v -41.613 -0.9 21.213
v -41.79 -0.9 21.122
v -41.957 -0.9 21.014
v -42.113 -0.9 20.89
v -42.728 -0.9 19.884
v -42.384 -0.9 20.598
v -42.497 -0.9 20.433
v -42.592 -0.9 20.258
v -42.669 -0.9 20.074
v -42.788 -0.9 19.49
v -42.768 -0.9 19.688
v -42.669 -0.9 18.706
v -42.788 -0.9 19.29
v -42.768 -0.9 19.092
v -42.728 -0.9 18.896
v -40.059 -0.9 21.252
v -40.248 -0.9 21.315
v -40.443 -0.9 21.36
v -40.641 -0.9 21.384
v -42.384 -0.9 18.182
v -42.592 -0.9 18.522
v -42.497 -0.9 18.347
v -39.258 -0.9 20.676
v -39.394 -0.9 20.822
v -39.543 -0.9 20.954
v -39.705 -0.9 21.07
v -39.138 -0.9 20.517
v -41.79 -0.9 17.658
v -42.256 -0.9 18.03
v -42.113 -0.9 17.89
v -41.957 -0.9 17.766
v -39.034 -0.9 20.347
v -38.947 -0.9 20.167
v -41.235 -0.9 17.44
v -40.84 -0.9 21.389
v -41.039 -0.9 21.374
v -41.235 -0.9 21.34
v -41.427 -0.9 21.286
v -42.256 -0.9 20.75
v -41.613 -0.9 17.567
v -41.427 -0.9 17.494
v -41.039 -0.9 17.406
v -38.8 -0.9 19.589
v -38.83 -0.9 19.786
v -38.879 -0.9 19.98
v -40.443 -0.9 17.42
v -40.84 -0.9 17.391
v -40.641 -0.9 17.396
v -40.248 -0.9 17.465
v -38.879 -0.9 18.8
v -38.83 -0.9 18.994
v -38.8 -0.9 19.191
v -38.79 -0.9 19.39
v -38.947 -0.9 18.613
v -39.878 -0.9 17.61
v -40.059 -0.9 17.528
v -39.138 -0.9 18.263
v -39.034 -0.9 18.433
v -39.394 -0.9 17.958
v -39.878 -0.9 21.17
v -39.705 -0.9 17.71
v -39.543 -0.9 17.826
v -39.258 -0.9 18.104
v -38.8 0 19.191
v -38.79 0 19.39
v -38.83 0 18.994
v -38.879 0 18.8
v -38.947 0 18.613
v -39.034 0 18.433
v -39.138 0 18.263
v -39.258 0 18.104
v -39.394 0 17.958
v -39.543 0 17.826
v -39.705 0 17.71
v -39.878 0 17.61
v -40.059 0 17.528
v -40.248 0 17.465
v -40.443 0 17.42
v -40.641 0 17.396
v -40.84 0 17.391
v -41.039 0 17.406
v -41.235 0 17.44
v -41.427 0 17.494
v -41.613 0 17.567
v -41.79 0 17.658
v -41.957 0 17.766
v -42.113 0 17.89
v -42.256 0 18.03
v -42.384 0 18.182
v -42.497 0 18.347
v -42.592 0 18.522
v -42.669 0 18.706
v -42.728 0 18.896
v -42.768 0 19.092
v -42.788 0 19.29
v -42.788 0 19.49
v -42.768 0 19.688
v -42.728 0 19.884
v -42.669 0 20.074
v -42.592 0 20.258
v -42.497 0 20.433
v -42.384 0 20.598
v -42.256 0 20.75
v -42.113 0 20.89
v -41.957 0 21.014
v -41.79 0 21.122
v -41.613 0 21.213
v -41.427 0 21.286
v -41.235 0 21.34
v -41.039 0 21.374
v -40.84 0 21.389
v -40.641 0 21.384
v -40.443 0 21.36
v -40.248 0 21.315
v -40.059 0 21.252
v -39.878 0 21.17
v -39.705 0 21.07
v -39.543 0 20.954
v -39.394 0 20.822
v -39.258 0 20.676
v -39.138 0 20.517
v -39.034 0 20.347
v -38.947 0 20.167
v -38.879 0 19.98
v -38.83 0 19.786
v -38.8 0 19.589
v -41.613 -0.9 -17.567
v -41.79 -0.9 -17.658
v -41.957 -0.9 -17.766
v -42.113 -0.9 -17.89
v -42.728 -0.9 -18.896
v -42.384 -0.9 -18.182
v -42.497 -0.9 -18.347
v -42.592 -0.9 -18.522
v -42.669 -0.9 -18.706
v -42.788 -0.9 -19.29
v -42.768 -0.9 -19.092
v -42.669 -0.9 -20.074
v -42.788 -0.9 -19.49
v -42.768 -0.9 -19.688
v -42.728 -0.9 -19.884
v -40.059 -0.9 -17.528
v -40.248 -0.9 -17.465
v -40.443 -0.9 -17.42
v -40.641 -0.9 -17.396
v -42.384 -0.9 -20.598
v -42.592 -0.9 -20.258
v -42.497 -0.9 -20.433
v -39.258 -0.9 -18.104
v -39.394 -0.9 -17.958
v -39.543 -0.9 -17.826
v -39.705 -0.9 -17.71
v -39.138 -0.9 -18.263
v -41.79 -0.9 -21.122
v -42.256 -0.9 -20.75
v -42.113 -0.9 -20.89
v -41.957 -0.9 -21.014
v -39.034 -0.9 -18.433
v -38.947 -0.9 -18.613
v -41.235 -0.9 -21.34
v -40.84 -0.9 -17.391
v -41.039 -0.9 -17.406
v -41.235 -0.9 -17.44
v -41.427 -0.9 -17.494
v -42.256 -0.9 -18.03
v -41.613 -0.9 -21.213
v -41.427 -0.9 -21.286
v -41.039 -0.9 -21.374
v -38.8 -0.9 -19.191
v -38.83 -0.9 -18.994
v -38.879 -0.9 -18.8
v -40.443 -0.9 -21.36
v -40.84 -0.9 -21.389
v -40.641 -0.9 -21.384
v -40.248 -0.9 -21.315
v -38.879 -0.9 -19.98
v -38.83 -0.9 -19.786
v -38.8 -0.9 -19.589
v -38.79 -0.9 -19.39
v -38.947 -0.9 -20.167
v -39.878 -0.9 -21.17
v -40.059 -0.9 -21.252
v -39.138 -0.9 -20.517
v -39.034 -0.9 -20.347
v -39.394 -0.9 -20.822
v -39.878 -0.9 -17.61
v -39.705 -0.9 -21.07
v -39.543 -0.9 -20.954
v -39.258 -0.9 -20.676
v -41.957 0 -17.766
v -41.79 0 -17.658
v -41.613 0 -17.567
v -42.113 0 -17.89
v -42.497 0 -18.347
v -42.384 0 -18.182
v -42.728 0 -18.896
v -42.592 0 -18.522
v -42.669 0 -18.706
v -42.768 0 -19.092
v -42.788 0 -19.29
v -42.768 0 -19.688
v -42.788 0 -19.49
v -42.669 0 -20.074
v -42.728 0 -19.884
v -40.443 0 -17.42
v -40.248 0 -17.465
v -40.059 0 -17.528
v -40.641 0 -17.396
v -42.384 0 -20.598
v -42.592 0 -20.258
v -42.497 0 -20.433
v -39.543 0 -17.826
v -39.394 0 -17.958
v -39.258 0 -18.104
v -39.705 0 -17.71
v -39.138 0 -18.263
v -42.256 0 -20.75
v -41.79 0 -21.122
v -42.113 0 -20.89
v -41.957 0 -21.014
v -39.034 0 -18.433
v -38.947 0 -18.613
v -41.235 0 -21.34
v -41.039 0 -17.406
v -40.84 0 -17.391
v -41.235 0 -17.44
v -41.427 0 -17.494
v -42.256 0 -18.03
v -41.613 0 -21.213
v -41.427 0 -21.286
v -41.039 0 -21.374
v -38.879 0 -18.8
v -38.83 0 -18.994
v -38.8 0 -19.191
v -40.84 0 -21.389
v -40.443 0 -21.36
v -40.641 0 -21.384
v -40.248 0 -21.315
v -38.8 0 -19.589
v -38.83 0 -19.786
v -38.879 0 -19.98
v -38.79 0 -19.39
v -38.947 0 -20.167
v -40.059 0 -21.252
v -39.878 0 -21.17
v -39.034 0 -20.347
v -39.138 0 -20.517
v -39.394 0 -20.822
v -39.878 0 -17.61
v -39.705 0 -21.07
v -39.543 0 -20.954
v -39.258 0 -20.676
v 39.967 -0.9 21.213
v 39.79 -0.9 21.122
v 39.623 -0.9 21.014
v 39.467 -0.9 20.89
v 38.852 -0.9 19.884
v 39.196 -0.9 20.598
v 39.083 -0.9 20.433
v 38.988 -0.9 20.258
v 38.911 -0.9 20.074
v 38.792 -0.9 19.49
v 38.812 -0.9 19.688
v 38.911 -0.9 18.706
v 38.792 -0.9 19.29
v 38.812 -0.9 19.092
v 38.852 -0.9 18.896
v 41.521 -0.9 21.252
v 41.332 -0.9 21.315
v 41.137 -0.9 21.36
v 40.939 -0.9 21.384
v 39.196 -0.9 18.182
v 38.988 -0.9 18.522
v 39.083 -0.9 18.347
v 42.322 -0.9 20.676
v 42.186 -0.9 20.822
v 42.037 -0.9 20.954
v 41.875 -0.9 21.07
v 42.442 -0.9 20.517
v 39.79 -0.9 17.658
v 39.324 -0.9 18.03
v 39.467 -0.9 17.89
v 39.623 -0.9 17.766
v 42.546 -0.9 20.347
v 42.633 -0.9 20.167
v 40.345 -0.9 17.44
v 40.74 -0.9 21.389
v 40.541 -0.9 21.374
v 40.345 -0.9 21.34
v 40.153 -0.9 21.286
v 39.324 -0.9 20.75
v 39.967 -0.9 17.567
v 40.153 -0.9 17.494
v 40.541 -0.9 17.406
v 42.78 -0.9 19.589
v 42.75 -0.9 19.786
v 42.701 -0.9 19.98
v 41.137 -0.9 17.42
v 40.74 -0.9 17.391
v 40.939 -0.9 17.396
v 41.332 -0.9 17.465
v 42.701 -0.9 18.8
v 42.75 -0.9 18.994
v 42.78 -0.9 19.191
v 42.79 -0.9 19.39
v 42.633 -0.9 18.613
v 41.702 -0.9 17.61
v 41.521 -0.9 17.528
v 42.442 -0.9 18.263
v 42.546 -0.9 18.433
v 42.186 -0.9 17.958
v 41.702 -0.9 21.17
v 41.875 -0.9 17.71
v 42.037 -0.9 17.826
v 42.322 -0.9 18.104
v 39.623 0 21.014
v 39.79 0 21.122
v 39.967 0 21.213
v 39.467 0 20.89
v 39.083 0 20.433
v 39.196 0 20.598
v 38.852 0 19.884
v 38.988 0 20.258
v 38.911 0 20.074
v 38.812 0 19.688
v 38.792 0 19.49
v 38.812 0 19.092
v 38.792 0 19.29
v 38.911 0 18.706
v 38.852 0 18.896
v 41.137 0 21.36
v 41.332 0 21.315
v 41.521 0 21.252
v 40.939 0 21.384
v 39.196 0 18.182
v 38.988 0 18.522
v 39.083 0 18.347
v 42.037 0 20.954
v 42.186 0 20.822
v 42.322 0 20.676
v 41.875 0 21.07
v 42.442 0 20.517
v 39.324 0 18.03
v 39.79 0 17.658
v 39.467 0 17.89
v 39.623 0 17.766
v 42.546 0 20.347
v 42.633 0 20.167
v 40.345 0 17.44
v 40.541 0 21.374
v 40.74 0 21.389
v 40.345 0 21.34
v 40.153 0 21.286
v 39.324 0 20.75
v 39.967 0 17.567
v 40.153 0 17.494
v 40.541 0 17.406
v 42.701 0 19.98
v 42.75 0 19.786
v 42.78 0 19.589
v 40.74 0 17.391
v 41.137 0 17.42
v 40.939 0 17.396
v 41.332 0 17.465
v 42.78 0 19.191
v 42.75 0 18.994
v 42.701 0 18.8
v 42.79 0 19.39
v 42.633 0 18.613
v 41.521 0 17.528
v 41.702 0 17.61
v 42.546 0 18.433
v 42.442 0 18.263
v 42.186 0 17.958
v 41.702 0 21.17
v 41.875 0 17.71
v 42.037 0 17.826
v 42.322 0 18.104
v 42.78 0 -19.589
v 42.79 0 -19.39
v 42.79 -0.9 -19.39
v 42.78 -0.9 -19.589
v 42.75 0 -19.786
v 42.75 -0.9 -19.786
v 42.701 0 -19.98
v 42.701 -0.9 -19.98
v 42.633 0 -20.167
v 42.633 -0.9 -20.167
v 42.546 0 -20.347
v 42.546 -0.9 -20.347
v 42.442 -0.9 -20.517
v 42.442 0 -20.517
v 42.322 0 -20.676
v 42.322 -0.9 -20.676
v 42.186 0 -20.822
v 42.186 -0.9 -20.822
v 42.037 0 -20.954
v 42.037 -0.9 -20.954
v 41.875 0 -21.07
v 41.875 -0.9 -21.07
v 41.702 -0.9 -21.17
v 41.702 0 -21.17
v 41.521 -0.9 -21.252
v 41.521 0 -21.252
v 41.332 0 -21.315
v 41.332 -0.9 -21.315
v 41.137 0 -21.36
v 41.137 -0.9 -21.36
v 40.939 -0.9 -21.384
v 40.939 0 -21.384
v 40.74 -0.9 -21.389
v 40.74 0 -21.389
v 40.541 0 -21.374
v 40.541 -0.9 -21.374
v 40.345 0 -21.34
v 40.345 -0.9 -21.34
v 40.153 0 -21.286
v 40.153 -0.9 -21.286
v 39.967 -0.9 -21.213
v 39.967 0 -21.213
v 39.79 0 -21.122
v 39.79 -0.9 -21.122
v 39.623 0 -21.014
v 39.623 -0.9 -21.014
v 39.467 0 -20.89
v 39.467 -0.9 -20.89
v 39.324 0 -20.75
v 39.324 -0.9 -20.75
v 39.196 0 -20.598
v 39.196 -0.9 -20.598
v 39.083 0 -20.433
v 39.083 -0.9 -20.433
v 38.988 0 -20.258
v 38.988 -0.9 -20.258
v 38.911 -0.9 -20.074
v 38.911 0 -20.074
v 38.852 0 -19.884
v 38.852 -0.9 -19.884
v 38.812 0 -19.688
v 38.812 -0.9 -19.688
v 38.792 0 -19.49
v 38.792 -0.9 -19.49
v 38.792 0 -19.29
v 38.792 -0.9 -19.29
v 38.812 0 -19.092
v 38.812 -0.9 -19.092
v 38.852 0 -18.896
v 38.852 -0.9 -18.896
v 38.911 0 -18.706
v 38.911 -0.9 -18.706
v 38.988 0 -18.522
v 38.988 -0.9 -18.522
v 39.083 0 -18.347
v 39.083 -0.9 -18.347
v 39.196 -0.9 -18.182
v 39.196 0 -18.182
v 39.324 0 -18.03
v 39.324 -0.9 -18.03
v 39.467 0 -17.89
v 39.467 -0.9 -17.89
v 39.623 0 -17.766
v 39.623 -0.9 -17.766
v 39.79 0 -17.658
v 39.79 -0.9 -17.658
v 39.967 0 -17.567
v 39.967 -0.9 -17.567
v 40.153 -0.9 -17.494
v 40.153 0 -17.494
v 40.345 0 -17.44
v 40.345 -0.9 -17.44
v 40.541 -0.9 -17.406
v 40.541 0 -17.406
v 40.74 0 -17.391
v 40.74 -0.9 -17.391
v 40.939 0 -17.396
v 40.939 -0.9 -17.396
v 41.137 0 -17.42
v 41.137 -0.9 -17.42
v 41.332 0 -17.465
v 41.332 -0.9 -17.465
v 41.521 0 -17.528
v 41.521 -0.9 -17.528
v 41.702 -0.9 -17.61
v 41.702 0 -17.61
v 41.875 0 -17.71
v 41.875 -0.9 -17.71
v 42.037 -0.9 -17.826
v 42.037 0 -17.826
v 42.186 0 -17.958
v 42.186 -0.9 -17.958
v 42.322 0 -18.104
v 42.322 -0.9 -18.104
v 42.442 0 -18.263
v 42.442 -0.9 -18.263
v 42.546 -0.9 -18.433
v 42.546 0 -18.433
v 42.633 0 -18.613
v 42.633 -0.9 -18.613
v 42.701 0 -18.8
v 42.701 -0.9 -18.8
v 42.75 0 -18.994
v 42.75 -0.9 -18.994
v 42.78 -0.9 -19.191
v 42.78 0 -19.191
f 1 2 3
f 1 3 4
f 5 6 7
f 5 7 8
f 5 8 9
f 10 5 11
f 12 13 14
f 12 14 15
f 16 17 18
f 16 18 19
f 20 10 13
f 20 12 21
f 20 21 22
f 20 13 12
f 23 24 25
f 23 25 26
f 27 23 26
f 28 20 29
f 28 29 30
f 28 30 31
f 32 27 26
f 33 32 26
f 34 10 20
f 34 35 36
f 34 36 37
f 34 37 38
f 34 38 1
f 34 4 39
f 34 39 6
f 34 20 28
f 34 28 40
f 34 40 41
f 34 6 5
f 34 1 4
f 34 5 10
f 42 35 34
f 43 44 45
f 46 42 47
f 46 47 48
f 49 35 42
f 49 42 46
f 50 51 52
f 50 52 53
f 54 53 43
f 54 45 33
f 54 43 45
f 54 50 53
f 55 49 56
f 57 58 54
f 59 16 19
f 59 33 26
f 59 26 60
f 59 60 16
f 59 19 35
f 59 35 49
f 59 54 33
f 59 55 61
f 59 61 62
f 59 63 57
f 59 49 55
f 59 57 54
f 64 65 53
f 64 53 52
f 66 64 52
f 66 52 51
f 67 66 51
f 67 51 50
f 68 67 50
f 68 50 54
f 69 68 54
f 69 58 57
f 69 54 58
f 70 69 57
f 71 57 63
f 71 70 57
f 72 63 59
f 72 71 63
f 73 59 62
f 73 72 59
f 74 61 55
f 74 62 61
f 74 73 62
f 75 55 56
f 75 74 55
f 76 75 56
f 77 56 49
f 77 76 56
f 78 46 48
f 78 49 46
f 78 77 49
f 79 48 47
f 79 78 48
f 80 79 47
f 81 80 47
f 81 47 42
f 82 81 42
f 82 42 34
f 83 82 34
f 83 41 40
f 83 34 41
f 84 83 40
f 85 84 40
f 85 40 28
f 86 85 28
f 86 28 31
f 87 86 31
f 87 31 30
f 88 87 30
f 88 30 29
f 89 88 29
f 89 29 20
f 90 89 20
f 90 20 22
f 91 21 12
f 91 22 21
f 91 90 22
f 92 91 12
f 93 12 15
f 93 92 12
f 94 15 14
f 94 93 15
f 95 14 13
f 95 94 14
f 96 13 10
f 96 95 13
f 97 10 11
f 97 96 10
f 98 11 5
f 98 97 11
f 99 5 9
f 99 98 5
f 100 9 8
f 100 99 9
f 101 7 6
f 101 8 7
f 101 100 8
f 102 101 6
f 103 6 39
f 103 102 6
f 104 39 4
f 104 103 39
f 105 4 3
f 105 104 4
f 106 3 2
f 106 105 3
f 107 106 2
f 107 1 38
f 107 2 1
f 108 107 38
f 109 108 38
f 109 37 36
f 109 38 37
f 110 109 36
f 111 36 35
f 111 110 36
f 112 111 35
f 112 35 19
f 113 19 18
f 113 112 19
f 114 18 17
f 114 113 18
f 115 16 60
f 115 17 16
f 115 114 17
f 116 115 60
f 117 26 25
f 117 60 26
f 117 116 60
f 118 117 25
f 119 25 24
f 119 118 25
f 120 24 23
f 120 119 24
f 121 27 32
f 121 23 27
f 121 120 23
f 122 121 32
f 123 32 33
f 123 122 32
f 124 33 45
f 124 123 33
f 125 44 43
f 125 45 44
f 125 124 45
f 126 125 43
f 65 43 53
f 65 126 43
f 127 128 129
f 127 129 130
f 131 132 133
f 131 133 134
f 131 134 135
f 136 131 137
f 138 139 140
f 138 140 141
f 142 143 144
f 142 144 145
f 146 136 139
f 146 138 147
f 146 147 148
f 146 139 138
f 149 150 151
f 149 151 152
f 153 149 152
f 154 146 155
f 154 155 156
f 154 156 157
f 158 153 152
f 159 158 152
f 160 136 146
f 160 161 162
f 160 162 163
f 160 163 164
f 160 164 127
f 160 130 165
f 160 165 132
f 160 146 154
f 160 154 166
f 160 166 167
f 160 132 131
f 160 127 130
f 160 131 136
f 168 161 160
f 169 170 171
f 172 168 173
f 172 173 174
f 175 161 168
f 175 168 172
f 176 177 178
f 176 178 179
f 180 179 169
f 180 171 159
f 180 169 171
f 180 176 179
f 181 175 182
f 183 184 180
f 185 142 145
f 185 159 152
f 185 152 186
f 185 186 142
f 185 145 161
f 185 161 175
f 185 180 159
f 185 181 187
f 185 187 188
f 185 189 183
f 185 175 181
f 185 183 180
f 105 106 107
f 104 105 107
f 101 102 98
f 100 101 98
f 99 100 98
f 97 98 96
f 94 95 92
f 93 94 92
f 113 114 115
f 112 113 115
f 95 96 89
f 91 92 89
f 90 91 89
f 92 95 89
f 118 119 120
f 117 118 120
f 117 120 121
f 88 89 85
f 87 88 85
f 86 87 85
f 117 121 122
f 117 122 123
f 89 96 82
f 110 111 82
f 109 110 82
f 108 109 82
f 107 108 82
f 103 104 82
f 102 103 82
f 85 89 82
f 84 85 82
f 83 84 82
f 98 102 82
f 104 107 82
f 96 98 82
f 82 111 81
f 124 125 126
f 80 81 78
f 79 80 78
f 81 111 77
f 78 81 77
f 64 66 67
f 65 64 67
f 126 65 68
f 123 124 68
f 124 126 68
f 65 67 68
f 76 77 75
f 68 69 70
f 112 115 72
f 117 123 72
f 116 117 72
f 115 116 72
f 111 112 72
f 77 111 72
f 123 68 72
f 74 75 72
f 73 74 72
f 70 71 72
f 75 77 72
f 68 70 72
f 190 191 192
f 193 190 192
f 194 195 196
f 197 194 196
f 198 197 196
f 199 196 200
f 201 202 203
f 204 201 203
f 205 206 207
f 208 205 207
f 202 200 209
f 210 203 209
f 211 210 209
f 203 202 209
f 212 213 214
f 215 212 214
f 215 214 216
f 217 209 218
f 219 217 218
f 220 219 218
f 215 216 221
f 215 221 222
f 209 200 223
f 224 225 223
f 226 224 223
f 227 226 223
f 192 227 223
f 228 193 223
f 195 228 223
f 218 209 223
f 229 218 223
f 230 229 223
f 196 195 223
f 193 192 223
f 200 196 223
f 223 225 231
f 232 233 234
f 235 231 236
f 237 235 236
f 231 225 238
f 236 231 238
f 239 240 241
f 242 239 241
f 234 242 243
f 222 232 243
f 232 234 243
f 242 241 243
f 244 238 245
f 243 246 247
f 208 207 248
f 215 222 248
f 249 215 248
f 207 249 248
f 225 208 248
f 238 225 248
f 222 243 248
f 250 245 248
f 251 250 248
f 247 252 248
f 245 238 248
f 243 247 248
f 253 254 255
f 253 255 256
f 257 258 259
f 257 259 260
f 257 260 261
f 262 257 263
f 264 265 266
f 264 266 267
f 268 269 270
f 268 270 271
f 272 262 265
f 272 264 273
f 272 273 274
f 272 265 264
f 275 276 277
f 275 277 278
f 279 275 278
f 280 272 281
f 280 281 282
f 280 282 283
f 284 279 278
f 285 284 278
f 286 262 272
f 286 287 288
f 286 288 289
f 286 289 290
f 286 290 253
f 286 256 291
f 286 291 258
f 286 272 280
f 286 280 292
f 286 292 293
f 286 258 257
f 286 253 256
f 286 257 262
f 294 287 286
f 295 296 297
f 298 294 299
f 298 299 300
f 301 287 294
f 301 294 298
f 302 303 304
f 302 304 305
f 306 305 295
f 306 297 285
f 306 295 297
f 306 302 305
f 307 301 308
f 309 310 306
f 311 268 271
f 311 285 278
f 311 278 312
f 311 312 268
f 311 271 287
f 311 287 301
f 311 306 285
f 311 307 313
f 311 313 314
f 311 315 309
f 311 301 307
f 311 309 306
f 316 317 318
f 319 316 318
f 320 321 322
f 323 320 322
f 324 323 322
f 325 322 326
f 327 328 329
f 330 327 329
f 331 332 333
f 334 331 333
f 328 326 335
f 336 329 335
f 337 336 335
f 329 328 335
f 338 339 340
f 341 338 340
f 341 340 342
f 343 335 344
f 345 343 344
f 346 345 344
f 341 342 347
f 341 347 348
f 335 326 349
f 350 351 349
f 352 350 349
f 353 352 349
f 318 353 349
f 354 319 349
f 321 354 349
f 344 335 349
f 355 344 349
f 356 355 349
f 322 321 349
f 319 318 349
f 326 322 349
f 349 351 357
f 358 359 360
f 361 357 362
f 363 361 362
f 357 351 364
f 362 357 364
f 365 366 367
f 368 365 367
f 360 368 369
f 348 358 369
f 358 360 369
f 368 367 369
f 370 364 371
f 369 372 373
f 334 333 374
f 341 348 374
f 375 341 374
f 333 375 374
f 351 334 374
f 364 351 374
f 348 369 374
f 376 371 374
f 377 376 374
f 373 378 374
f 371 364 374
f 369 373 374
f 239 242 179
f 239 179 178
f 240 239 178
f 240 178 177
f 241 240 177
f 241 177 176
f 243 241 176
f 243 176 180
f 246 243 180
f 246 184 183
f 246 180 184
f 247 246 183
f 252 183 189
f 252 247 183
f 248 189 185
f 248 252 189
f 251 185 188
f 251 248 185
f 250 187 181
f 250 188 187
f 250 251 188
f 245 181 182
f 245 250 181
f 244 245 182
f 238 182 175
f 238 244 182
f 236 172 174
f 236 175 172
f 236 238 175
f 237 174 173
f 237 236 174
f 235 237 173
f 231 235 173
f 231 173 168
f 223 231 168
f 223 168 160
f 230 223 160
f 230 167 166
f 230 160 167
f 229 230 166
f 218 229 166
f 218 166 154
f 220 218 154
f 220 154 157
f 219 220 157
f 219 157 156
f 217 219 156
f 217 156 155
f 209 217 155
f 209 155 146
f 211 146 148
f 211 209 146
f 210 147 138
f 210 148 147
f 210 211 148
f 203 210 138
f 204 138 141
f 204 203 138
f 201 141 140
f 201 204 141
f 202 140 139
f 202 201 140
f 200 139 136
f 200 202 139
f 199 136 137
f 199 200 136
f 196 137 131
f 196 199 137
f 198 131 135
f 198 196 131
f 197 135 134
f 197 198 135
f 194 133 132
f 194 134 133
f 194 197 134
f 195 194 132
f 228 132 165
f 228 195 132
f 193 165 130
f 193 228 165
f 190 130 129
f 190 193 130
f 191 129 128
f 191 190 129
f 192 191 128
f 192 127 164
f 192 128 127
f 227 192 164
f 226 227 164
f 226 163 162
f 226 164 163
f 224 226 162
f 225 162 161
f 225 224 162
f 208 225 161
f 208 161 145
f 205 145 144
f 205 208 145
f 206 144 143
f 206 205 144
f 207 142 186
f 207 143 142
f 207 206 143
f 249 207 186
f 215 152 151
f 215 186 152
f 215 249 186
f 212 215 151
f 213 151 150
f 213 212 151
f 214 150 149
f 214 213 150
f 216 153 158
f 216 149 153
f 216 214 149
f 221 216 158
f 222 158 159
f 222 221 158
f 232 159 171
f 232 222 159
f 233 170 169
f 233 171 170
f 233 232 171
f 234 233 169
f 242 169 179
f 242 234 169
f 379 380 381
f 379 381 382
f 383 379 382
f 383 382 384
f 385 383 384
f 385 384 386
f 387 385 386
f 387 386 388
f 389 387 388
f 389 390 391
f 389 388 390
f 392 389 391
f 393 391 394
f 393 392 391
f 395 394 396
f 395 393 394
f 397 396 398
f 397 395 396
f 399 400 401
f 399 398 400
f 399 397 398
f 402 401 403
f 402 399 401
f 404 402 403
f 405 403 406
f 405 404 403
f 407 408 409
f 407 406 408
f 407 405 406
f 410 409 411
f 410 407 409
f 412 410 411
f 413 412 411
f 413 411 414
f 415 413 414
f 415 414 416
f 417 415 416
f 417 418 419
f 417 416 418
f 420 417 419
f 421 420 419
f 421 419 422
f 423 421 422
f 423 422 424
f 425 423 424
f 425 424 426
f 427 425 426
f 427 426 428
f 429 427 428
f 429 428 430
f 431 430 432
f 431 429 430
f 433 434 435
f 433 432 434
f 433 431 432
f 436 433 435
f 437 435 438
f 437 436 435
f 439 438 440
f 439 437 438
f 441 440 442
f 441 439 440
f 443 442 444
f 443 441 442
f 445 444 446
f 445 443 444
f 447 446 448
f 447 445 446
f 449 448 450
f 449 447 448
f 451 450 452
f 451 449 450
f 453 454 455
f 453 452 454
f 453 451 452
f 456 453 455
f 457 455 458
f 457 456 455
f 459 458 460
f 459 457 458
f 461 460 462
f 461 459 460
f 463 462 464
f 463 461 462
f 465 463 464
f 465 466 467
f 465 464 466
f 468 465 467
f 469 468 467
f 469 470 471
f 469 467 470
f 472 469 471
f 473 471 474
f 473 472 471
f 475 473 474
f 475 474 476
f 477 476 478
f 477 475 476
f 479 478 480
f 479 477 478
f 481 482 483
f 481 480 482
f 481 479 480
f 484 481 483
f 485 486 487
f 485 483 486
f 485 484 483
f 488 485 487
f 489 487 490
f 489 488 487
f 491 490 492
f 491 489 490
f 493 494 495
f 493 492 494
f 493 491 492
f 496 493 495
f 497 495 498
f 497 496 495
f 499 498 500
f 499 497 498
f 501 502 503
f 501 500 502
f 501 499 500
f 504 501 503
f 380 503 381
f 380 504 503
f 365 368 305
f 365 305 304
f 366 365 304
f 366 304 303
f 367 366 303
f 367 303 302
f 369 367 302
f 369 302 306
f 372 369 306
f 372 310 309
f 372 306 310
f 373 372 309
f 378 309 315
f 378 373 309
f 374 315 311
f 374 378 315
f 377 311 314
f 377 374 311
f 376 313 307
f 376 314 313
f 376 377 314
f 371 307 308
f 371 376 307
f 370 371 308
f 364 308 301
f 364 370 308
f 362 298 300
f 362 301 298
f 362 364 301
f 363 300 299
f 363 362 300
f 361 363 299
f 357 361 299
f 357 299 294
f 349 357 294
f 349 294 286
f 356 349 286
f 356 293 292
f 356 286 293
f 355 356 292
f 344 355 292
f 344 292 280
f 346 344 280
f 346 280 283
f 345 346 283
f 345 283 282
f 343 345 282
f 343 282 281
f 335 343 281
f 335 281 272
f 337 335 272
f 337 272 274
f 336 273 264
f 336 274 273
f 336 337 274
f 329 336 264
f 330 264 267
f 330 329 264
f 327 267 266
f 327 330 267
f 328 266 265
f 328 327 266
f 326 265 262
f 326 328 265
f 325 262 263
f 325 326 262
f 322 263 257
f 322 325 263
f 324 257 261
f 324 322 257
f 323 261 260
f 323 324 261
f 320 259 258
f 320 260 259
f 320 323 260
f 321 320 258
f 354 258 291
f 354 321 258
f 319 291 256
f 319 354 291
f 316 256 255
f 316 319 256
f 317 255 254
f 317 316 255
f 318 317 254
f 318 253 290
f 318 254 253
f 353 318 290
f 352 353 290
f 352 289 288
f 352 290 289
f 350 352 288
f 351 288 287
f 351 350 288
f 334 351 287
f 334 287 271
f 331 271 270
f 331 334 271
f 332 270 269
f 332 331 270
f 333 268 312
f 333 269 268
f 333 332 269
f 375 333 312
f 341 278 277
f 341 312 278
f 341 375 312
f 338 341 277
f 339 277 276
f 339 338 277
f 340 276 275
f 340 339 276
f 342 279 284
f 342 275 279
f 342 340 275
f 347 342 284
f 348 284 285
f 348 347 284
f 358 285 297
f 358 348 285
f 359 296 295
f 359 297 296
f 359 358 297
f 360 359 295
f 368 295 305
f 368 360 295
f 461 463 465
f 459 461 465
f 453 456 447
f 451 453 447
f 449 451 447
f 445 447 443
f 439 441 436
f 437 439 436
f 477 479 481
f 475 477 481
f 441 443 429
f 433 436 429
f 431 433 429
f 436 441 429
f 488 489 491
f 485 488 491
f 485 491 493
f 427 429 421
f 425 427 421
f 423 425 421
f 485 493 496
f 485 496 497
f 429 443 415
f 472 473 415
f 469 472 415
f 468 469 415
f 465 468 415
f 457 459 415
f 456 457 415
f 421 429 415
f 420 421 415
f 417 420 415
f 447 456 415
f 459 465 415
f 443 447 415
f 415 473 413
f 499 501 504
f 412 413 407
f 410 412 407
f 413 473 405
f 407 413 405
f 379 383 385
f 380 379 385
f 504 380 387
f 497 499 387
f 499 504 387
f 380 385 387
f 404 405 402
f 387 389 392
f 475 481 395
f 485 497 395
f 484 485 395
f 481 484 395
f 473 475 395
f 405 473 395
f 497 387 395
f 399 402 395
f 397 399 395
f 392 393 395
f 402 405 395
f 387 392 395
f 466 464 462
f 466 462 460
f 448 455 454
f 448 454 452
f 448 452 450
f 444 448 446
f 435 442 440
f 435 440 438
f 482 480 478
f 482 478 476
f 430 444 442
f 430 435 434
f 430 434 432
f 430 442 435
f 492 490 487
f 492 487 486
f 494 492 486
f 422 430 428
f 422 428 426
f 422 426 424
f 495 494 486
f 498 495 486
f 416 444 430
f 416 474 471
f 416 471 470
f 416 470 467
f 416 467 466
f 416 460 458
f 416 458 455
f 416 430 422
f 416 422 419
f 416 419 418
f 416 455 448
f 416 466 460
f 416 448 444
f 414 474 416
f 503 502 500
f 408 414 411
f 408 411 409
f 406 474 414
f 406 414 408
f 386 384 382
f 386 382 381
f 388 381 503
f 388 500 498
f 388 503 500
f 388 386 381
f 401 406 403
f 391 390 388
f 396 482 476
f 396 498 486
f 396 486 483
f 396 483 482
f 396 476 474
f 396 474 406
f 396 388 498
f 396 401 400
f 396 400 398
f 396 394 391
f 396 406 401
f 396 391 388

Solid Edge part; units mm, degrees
sketch "Sketch1" plane through (0, 0, 0) normal (0, -1, 0) x (1, 0, 0)
  circle A0 centre (-40.79, -19.39) radius 2
  circle A1 centre (40.79, -19.39) radius 2
  circle A2 centre (40.79, 19.39) radius 2
  circle A3 centre (-40.79, 19.39) radius 2
  dimension "D1" = 40.79
  dimension "D2" = 40.79
  dimension "D3" = 19.39
  dimension "D4" = 19.39
extrude "Protrusion1" add sketch "Sketch1" along normal blind 0.9
